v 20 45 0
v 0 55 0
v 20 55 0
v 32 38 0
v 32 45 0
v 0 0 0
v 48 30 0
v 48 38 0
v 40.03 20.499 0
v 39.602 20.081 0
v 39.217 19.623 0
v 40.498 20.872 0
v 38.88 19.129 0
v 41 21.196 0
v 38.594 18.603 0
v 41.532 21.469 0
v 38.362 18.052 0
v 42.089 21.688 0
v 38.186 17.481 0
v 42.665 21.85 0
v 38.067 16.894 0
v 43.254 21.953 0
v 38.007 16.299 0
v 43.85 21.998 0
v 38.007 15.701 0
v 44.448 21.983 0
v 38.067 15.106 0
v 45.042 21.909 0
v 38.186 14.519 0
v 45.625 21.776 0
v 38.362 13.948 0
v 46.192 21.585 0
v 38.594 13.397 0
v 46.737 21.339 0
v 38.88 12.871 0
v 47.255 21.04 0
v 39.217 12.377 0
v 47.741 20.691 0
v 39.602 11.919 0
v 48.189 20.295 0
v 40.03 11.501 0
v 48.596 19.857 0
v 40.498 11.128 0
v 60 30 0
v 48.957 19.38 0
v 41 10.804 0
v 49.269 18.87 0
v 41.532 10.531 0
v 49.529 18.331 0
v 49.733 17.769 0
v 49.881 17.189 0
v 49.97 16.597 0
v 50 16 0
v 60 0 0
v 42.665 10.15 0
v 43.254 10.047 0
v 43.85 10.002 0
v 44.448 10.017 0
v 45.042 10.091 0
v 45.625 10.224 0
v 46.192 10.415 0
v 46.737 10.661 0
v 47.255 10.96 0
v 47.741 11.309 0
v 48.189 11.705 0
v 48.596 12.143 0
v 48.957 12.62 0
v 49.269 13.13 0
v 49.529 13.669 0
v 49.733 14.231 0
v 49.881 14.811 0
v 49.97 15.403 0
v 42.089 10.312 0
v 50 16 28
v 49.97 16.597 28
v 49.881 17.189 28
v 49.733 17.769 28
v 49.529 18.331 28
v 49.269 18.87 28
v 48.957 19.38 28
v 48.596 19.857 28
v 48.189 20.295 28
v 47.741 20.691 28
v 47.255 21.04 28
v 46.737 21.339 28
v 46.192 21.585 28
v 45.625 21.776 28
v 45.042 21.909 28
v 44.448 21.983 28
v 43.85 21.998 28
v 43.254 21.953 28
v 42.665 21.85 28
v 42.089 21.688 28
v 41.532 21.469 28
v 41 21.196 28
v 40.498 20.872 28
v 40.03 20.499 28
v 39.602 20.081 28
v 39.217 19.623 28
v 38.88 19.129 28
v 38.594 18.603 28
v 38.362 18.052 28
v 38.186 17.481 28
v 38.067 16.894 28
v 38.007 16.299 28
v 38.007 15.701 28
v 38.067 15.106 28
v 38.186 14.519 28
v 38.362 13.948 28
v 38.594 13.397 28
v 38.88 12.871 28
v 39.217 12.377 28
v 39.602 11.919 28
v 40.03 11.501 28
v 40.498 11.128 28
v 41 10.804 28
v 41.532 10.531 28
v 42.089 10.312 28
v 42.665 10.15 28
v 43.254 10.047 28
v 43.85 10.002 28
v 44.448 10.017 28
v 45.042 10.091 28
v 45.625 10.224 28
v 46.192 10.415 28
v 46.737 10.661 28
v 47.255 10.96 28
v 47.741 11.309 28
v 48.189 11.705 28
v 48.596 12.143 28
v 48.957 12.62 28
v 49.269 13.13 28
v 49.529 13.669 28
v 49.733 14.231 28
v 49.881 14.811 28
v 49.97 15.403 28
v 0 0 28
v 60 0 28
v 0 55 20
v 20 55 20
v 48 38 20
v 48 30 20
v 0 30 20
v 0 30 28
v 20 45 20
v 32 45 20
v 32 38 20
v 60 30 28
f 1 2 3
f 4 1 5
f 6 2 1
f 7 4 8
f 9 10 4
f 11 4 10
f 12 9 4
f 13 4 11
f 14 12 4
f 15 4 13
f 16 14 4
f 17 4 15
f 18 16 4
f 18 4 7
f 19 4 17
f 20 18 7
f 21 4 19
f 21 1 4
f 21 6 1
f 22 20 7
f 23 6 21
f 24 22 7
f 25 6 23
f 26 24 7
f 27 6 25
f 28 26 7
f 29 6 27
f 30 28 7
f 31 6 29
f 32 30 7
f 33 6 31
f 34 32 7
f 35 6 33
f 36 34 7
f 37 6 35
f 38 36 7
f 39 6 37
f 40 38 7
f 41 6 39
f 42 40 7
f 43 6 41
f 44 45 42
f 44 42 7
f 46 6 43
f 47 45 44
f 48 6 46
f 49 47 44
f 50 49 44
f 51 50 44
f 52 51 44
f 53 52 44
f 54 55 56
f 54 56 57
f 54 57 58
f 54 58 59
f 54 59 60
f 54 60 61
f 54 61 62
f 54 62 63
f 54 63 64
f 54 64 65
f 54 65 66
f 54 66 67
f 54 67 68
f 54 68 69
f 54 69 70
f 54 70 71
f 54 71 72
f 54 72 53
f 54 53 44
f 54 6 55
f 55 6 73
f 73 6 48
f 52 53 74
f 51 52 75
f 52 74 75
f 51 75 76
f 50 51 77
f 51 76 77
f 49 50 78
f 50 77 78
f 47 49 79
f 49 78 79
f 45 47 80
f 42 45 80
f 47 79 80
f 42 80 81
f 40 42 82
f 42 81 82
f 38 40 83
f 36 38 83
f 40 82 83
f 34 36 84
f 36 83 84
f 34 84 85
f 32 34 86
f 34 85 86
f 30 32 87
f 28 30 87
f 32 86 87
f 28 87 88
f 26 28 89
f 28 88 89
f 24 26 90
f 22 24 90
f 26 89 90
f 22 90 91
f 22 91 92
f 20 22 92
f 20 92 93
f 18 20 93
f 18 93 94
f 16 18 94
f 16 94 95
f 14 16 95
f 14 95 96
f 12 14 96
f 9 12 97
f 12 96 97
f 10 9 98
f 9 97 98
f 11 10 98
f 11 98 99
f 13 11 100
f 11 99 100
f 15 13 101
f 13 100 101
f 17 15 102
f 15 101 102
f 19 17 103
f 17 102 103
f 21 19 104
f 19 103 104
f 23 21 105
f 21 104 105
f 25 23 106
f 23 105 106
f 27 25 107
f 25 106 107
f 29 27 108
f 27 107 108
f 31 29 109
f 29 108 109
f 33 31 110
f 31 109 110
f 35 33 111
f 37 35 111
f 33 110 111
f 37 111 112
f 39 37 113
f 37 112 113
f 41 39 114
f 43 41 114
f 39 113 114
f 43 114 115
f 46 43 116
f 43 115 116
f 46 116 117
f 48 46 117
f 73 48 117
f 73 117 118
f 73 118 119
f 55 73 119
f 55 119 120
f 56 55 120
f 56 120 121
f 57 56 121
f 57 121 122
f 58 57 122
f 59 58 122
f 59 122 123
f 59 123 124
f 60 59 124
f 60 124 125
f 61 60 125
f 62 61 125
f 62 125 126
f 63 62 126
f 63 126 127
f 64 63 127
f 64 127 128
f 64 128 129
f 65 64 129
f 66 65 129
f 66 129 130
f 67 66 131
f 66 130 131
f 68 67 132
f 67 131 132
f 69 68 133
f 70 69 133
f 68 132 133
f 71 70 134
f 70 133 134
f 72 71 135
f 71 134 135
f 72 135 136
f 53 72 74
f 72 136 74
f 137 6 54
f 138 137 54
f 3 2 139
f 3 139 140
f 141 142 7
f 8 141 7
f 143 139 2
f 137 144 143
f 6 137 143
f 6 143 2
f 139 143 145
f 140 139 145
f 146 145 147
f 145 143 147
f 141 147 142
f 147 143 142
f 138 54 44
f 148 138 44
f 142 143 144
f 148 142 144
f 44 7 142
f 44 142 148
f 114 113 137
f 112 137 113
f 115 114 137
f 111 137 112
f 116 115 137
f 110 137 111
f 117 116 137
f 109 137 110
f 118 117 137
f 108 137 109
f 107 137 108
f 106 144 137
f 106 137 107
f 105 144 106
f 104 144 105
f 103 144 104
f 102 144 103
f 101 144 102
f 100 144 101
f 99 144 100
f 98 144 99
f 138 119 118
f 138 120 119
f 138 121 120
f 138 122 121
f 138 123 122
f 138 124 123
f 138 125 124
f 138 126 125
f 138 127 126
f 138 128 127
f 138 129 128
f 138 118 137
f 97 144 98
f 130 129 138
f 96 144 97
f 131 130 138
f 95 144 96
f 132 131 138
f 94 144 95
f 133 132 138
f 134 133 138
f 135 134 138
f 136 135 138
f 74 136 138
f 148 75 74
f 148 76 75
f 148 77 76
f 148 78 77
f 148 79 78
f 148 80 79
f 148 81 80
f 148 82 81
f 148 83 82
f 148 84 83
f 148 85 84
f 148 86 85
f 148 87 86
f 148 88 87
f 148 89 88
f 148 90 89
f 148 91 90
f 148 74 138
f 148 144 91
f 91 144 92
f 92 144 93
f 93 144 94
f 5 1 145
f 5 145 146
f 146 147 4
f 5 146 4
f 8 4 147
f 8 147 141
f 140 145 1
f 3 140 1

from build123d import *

# Parameters (mm, degrees)
SKETCH1_W           = 60
SKETCH1_H           = 30
BOSS_EXTRUDE1_DEPTH = 28
SKETCH2_R           = 6
CUT_EXTRUDE1_DEPTH  = 28
SKETCH3_W           = 20
SKETCH3_H           = 20
BOSS_EXTRUDE3_DEPTH = 25
SKETCH5_W           = 12
SKETCH5_H           = 20
BOSS_EXTRUDE4_DEPTH = 15
SKETCH8_W           = 16
SKETCH8_H           = 20
BOSS_EXTRUDE5_DEPTH = 8


with BuildPart() as part:
    # Sketch1 → Boss-Extrude1 (new body)
    with BuildSketch(Plane.XY):
        with Locations((30, 15)):
            Rectangle(SKETCH1_W, SKETCH1_H)
    extrude(amount=BOSS_EXTRUDE1_DEPTH)

    # Sketch2 → Cut-Extrude1 (cut)
    with BuildSketch(Plane.XY.offset(28)):
        with Locations((44, 16)):
            Circle(SKETCH2_R)
    extrude(amount=-CUT_EXTRUDE1_DEPTH, mode=Mode.SUBTRACT)

    # Sketch3 → Boss-Extrude3 (add)
    with BuildSketch(Plane(origin=(0, 30, 0), x_dir=(1, 0, 0), z_dir=(0, 1, 0))):
        with Locations((10, -10)):
            Rectangle(SKETCH3_W, SKETCH3_H)
    extrude(amount=BOSS_EXTRUDE3_DEPTH)

    # Sketch5 → Boss-Extrude4 (add)
    with BuildSketch(Plane(origin=(0, 30, 0), x_dir=(1, 0, 0), z_dir=(0, 1, 0))):
        with Locations((26, -10)):
            Rectangle(SKETCH5_W, SKETCH5_H)
    extrude(amount=BOSS_EXTRUDE4_DEPTH)

    # Sketch8 → Boss-Extrude5 (add)
    with BuildSketch(Plane(origin=(0, 30, 0), x_dir=(1, 0, 0), z_dir=(0, 1, 0))):
        with Locations((40, -10)):
            Rectangle(SKETCH8_W, SKETCH8_H)
    extrude(amount=BOSS_EXTRUDE5_DEPTH)


solid = part.part
